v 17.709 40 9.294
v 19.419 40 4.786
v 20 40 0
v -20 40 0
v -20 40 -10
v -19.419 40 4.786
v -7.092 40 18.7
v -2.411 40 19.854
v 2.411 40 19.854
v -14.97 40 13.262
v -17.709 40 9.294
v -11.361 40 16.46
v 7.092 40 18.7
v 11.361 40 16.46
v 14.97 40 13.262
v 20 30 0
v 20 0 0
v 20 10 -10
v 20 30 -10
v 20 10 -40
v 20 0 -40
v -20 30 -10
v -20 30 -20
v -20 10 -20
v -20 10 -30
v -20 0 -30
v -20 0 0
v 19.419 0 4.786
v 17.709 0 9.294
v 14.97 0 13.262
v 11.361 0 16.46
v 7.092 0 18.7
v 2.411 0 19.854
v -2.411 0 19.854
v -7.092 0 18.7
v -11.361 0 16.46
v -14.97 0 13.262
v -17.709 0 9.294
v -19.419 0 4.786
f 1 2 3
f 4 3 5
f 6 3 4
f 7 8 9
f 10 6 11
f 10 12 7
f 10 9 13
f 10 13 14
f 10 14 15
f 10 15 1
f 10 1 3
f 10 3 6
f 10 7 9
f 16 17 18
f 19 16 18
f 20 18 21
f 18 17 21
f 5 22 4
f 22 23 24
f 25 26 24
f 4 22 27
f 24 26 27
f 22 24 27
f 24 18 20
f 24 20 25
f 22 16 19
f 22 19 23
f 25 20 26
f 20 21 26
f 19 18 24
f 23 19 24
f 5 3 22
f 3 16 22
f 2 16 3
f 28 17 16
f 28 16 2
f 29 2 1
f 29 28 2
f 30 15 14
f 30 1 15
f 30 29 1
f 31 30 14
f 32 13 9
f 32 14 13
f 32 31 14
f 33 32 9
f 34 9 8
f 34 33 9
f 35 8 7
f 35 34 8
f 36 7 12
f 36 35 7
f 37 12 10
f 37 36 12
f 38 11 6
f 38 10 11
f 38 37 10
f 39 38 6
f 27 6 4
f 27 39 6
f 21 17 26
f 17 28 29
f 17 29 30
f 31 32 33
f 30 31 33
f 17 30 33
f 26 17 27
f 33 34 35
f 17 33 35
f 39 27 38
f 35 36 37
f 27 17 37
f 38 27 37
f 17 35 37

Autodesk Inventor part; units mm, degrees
ref_plane "YZ Plane" through (0, 0, 0) normal (1, 0, 0) x (0, 1, 0)
ref_plane "XZ Plane" through (0, 0, 0) normal (0, 1, 0) x (-1, 0, 0)
ref_plane "XY Plane" through (0, 0, 0) normal (0, 0, 1) x (1, 0, 0)
sketch "草圖1" plane through (0, 0, 0) normal (0, 1, 0) x (-1, 0, 0)
  line L0 (-20, 0) -> (-20, -40)
  line L1 (20, -30) -> (20, 0)
  line L2 (-20, 0) -> (20, -10)
  line L3 (-20, -10) -> (20, -20)
  arc A0 (20, 0) -> (-20, 0) centre (0, 0) ccw
  line L4 (-20, -40) -> (20, -30)
  dimension "d11" = 20
  dimension "d13" = 10
  dimension "d14" = 20
  dimension "d16" = 40
  dimension "d17" = 30
  dimension "d18" = 40
  dimension "d19" = 30
extrude "擠出1" add sketch "草圖1" along normal blind 40 contours A0 L1 L2
extrude "擠出2" add sketch "草圖1" along normal blind 30 contours L2 L1 L3 L0
extrude "擠出3" add sketch "草圖1" along normal blind 10
